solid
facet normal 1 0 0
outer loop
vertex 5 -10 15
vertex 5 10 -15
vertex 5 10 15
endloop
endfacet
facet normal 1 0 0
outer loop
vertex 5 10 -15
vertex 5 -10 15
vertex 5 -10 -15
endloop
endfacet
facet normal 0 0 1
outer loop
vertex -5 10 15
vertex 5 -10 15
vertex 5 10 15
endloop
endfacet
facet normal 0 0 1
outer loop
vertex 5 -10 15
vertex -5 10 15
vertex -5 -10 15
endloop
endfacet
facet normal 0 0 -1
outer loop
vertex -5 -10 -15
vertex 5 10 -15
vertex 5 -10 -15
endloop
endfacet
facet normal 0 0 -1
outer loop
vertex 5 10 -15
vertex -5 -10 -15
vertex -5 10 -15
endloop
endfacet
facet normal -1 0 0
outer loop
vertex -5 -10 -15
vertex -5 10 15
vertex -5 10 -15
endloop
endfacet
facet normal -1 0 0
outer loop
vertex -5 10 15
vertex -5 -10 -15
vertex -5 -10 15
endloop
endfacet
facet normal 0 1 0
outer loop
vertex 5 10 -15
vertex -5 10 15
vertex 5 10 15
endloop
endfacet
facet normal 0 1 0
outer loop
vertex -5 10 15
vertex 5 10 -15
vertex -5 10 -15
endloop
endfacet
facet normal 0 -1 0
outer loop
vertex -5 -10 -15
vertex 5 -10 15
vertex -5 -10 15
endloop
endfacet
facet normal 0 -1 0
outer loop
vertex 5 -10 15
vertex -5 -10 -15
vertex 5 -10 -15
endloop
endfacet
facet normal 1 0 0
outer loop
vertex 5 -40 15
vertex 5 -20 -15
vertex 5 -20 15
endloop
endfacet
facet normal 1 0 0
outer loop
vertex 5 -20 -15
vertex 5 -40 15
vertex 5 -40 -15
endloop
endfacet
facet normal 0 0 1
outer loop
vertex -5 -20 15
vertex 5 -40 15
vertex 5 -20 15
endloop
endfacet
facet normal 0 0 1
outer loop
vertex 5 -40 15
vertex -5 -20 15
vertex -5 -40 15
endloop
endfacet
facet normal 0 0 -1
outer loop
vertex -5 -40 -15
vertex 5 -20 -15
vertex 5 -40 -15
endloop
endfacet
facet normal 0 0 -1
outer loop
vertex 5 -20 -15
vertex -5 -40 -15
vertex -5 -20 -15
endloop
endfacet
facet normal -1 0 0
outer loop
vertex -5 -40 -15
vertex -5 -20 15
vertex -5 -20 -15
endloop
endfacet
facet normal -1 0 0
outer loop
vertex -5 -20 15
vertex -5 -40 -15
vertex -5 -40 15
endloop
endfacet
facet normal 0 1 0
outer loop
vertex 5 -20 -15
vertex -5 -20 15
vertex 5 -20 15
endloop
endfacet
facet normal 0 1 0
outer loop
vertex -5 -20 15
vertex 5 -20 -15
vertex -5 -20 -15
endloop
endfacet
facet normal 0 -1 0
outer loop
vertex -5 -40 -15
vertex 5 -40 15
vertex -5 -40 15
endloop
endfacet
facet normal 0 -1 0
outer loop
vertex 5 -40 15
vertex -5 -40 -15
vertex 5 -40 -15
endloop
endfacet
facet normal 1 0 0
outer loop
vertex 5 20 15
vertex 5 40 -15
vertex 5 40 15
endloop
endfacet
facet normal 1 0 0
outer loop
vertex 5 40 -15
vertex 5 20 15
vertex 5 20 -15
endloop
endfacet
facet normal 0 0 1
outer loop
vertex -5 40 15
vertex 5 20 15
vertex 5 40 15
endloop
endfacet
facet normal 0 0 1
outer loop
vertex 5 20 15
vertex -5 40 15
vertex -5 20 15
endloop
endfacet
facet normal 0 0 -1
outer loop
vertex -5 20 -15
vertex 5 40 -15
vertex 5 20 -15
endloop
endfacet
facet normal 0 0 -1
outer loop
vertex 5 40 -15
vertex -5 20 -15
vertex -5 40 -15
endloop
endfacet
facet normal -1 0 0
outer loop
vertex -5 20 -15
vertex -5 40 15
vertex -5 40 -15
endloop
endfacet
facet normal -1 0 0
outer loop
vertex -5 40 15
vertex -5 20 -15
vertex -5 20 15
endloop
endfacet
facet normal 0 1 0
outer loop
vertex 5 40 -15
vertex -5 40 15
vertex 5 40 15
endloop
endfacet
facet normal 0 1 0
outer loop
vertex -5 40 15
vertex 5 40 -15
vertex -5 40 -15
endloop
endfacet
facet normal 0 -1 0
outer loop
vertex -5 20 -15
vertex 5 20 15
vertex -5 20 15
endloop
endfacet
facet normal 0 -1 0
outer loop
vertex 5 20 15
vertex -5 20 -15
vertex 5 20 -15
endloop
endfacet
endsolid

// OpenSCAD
brightness = 1.0;

translate([0, 0, 0])
color([brightness, 0.0, 0.0]) 
cube( [10,20,30], center=true );

translate([0, -30, 0])
color([0.0, brightness, 0.0]) 
cube( [10,20,30], center=true );

translate([0, 30, 0])
color([0.0, 0.0, brightness]) 
cube( [10,20,30], center=true );
